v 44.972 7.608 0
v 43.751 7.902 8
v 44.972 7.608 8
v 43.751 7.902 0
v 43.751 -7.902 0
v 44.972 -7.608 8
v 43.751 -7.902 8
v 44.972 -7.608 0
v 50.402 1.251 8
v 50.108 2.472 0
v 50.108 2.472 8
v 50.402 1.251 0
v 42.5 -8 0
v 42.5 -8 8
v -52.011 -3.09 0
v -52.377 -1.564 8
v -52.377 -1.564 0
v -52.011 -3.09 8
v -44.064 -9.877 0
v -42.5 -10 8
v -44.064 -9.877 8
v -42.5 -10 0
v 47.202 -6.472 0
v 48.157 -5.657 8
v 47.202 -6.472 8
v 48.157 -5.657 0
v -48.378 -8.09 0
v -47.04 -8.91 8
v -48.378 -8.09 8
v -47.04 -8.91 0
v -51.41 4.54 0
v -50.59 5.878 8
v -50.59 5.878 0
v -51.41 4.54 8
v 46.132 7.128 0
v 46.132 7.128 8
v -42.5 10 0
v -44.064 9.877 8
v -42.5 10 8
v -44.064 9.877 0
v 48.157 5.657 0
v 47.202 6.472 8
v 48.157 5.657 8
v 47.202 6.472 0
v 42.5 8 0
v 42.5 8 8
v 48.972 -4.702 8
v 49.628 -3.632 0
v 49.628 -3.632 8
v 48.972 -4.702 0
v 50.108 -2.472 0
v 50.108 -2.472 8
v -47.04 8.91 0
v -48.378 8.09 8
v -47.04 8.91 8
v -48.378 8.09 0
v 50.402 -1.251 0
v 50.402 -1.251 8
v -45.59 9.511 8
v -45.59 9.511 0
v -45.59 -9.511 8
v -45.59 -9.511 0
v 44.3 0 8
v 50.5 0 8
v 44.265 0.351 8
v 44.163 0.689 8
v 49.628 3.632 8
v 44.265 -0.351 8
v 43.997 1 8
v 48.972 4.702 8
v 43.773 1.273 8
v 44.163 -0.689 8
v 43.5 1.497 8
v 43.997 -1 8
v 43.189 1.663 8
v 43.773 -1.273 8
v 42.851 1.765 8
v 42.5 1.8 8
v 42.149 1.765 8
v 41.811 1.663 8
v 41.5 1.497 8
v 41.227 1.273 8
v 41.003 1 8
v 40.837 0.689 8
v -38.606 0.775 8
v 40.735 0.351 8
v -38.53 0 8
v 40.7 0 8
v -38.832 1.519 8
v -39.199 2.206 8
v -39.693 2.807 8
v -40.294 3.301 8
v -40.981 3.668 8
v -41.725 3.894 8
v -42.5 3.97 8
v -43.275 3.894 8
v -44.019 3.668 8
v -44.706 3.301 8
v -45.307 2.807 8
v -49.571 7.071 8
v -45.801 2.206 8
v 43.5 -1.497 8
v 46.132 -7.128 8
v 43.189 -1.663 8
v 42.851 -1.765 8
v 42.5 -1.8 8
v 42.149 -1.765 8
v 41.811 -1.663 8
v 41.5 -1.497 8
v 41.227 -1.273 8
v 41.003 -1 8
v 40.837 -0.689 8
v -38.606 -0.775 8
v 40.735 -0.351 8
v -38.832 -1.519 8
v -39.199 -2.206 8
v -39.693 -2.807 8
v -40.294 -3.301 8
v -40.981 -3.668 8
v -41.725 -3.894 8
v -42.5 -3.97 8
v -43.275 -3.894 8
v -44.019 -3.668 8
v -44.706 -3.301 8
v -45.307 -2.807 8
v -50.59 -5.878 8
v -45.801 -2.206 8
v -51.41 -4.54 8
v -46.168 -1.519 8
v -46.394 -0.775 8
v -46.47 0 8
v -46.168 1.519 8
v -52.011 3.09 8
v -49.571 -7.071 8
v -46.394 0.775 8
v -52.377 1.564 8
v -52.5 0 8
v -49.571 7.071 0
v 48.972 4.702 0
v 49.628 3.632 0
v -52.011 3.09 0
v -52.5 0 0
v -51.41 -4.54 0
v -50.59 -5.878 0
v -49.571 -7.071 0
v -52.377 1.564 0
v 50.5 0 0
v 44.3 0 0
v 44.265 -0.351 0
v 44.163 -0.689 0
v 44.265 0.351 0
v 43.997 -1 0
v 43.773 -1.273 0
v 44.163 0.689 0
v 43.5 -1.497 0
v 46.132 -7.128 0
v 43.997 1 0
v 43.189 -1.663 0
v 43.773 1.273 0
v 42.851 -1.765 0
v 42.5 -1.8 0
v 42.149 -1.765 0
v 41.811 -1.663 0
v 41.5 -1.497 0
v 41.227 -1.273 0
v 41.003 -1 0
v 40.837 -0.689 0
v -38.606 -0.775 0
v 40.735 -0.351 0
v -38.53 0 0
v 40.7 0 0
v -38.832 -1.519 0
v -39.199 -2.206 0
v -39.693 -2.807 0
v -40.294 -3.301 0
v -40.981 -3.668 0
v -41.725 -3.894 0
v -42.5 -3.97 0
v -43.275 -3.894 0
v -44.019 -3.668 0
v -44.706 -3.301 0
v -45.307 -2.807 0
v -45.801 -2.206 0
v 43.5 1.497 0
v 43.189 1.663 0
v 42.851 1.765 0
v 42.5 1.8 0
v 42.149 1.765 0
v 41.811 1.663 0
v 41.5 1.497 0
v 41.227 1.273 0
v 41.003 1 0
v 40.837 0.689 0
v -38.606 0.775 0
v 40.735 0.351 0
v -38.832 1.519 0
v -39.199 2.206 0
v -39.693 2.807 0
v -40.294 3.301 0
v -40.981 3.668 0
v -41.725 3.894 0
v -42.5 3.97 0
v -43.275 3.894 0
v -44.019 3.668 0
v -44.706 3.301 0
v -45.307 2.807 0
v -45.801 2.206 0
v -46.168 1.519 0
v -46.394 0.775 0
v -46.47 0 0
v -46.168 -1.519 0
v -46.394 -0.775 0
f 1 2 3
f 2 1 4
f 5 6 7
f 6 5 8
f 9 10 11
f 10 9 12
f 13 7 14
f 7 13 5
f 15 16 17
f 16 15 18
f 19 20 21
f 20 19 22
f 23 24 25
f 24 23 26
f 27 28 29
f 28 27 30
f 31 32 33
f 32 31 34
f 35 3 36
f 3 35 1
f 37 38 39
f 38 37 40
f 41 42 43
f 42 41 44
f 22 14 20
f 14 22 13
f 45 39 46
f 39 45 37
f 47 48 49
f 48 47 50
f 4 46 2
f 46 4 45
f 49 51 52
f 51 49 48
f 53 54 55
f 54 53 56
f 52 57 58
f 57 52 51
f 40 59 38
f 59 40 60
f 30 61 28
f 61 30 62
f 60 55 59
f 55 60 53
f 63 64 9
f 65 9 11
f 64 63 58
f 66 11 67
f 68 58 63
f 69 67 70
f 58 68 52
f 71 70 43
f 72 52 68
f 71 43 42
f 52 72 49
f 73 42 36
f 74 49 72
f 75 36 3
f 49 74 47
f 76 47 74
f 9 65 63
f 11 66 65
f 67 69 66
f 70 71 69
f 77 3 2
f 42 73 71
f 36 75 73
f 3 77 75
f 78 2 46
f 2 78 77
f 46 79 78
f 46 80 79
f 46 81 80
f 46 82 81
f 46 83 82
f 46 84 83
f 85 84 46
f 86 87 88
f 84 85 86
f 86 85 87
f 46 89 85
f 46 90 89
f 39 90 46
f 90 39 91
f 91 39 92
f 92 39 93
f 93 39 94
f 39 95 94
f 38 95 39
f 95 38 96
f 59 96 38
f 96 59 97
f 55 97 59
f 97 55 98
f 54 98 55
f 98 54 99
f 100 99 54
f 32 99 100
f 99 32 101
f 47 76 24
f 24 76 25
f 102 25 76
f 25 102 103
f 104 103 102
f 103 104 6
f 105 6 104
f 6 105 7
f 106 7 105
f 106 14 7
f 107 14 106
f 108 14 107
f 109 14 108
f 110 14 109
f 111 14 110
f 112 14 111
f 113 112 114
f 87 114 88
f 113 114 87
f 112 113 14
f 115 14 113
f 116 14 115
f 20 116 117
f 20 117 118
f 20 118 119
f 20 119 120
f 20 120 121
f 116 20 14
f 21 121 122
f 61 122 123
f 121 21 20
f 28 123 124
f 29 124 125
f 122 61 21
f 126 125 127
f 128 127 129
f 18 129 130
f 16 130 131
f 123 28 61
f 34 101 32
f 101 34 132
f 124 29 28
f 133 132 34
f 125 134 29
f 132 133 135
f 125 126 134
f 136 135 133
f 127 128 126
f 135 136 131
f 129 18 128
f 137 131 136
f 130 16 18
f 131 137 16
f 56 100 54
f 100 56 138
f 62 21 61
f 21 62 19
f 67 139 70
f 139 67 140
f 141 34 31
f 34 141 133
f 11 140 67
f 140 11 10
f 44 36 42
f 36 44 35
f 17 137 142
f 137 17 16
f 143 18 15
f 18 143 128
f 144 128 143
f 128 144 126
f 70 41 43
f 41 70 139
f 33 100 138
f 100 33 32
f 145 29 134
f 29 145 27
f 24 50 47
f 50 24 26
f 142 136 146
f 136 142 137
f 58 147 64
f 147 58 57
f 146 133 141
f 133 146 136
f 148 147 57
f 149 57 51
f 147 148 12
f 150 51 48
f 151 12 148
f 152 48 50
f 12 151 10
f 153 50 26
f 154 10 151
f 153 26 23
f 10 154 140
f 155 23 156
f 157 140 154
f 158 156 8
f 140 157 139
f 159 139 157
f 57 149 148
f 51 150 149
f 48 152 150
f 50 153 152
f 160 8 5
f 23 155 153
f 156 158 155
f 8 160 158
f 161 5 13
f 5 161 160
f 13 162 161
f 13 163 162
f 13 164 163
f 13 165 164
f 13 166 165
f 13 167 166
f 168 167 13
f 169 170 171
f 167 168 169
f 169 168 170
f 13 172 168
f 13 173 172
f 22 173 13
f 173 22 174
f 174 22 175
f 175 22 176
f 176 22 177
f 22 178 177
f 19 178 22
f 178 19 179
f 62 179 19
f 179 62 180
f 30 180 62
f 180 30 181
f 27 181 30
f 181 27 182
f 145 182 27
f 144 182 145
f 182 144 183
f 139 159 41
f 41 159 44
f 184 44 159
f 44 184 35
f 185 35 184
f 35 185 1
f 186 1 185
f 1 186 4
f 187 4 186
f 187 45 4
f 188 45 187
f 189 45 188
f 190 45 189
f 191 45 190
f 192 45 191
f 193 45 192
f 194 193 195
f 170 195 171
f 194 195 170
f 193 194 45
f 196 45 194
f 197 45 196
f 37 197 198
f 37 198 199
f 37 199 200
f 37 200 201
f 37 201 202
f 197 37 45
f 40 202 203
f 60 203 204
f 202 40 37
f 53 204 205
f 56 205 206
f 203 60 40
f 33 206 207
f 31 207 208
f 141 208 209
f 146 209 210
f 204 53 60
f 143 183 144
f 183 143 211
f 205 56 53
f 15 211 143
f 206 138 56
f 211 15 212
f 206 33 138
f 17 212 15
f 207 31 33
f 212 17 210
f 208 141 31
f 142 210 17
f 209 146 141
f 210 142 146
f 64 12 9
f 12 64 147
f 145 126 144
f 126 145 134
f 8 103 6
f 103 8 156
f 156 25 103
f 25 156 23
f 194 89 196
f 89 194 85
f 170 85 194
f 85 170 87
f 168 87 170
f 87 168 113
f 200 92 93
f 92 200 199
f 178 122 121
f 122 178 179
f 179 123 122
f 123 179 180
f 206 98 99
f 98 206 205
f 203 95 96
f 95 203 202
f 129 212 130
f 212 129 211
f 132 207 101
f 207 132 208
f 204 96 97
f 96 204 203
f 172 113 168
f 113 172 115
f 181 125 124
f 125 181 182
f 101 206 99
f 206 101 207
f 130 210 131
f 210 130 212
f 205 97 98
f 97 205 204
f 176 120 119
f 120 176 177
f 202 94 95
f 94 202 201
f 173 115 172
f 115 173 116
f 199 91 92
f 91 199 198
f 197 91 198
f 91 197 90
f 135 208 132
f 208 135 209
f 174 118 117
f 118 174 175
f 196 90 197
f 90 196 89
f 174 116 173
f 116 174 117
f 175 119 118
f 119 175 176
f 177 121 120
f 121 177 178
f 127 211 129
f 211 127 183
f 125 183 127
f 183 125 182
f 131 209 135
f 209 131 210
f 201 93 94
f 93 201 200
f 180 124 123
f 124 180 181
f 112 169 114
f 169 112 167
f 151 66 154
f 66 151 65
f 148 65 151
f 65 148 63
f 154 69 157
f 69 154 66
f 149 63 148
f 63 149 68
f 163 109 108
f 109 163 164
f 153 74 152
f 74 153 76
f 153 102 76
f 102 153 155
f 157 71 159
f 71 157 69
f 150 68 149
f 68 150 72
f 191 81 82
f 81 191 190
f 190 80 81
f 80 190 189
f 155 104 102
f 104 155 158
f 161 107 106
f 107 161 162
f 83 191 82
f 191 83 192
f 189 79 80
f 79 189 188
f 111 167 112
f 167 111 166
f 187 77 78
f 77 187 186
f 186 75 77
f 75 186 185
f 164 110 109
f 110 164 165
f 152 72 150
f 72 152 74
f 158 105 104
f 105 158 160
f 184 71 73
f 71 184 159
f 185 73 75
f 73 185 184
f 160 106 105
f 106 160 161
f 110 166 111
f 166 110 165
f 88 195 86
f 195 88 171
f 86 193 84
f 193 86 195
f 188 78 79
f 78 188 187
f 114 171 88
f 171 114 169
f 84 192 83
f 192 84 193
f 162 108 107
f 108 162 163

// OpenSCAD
$fn = 32;

// ----------------------------------------------------------------------
// Lever: 85 mm between the bosses, 8 mm thick, smooth outline
// ----------------------------------------------------------------------

// --- parameters (mm) ---
lever_l = 85;             // distance between the boss centres
boss_a = 20;              // first boss diameter
boss_b = 16;              // second boss diameter
bore_a = 7.94;            // first bore
bore_b = 3.6;             // second bore
lever_t = 8;              // lever thickness

lever_profile = [[-52.5, 0], [-52.377, -1.564], [-52.011, -3.09], [-51.41, -4.54], [-50.59, -5.878], [-49.571, -7.071], [-48.378, -8.09], [-47.04, -8.91], [-45.59, -9.511], [-44.064, -9.877], [-42.5, -10], [42.5, -8], [43.751, -7.902], [44.972, -7.608], [46.132, -7.128], [47.202, -6.472], [48.157, -5.657], [48.972, -4.702], [49.628, -3.632], [50.108, -2.472], [50.402, -1.251], [50.5, 0], [50.402, 1.251], [50.108, 2.472], [49.628, 3.632], [48.972, 4.702], [48.157, 5.657], [47.202, 6.472], [46.132, 7.128], [44.972, 7.608], [43.751, 7.902], [42.5, 8], [-42.5, 10], [-44.064, 9.877], [-45.59, 9.511], [-47.04, 8.91], [-48.378, 8.09], [-49.571, 7.071], [-50.59, 5.878], [-51.41, 4.54], [-52.011, 3.09], [-52.377, 1.564]];

difference() {
  linear_extrude(height = lever_t) polygon(lever_profile);
  translate([-42.5, 0, -2.5]) cylinder(h = lever_t + 5, d = bore_a);
  translate([42.5, 0, -2.5]) cylinder(h = lever_t + 5, d = bore_b);
}
